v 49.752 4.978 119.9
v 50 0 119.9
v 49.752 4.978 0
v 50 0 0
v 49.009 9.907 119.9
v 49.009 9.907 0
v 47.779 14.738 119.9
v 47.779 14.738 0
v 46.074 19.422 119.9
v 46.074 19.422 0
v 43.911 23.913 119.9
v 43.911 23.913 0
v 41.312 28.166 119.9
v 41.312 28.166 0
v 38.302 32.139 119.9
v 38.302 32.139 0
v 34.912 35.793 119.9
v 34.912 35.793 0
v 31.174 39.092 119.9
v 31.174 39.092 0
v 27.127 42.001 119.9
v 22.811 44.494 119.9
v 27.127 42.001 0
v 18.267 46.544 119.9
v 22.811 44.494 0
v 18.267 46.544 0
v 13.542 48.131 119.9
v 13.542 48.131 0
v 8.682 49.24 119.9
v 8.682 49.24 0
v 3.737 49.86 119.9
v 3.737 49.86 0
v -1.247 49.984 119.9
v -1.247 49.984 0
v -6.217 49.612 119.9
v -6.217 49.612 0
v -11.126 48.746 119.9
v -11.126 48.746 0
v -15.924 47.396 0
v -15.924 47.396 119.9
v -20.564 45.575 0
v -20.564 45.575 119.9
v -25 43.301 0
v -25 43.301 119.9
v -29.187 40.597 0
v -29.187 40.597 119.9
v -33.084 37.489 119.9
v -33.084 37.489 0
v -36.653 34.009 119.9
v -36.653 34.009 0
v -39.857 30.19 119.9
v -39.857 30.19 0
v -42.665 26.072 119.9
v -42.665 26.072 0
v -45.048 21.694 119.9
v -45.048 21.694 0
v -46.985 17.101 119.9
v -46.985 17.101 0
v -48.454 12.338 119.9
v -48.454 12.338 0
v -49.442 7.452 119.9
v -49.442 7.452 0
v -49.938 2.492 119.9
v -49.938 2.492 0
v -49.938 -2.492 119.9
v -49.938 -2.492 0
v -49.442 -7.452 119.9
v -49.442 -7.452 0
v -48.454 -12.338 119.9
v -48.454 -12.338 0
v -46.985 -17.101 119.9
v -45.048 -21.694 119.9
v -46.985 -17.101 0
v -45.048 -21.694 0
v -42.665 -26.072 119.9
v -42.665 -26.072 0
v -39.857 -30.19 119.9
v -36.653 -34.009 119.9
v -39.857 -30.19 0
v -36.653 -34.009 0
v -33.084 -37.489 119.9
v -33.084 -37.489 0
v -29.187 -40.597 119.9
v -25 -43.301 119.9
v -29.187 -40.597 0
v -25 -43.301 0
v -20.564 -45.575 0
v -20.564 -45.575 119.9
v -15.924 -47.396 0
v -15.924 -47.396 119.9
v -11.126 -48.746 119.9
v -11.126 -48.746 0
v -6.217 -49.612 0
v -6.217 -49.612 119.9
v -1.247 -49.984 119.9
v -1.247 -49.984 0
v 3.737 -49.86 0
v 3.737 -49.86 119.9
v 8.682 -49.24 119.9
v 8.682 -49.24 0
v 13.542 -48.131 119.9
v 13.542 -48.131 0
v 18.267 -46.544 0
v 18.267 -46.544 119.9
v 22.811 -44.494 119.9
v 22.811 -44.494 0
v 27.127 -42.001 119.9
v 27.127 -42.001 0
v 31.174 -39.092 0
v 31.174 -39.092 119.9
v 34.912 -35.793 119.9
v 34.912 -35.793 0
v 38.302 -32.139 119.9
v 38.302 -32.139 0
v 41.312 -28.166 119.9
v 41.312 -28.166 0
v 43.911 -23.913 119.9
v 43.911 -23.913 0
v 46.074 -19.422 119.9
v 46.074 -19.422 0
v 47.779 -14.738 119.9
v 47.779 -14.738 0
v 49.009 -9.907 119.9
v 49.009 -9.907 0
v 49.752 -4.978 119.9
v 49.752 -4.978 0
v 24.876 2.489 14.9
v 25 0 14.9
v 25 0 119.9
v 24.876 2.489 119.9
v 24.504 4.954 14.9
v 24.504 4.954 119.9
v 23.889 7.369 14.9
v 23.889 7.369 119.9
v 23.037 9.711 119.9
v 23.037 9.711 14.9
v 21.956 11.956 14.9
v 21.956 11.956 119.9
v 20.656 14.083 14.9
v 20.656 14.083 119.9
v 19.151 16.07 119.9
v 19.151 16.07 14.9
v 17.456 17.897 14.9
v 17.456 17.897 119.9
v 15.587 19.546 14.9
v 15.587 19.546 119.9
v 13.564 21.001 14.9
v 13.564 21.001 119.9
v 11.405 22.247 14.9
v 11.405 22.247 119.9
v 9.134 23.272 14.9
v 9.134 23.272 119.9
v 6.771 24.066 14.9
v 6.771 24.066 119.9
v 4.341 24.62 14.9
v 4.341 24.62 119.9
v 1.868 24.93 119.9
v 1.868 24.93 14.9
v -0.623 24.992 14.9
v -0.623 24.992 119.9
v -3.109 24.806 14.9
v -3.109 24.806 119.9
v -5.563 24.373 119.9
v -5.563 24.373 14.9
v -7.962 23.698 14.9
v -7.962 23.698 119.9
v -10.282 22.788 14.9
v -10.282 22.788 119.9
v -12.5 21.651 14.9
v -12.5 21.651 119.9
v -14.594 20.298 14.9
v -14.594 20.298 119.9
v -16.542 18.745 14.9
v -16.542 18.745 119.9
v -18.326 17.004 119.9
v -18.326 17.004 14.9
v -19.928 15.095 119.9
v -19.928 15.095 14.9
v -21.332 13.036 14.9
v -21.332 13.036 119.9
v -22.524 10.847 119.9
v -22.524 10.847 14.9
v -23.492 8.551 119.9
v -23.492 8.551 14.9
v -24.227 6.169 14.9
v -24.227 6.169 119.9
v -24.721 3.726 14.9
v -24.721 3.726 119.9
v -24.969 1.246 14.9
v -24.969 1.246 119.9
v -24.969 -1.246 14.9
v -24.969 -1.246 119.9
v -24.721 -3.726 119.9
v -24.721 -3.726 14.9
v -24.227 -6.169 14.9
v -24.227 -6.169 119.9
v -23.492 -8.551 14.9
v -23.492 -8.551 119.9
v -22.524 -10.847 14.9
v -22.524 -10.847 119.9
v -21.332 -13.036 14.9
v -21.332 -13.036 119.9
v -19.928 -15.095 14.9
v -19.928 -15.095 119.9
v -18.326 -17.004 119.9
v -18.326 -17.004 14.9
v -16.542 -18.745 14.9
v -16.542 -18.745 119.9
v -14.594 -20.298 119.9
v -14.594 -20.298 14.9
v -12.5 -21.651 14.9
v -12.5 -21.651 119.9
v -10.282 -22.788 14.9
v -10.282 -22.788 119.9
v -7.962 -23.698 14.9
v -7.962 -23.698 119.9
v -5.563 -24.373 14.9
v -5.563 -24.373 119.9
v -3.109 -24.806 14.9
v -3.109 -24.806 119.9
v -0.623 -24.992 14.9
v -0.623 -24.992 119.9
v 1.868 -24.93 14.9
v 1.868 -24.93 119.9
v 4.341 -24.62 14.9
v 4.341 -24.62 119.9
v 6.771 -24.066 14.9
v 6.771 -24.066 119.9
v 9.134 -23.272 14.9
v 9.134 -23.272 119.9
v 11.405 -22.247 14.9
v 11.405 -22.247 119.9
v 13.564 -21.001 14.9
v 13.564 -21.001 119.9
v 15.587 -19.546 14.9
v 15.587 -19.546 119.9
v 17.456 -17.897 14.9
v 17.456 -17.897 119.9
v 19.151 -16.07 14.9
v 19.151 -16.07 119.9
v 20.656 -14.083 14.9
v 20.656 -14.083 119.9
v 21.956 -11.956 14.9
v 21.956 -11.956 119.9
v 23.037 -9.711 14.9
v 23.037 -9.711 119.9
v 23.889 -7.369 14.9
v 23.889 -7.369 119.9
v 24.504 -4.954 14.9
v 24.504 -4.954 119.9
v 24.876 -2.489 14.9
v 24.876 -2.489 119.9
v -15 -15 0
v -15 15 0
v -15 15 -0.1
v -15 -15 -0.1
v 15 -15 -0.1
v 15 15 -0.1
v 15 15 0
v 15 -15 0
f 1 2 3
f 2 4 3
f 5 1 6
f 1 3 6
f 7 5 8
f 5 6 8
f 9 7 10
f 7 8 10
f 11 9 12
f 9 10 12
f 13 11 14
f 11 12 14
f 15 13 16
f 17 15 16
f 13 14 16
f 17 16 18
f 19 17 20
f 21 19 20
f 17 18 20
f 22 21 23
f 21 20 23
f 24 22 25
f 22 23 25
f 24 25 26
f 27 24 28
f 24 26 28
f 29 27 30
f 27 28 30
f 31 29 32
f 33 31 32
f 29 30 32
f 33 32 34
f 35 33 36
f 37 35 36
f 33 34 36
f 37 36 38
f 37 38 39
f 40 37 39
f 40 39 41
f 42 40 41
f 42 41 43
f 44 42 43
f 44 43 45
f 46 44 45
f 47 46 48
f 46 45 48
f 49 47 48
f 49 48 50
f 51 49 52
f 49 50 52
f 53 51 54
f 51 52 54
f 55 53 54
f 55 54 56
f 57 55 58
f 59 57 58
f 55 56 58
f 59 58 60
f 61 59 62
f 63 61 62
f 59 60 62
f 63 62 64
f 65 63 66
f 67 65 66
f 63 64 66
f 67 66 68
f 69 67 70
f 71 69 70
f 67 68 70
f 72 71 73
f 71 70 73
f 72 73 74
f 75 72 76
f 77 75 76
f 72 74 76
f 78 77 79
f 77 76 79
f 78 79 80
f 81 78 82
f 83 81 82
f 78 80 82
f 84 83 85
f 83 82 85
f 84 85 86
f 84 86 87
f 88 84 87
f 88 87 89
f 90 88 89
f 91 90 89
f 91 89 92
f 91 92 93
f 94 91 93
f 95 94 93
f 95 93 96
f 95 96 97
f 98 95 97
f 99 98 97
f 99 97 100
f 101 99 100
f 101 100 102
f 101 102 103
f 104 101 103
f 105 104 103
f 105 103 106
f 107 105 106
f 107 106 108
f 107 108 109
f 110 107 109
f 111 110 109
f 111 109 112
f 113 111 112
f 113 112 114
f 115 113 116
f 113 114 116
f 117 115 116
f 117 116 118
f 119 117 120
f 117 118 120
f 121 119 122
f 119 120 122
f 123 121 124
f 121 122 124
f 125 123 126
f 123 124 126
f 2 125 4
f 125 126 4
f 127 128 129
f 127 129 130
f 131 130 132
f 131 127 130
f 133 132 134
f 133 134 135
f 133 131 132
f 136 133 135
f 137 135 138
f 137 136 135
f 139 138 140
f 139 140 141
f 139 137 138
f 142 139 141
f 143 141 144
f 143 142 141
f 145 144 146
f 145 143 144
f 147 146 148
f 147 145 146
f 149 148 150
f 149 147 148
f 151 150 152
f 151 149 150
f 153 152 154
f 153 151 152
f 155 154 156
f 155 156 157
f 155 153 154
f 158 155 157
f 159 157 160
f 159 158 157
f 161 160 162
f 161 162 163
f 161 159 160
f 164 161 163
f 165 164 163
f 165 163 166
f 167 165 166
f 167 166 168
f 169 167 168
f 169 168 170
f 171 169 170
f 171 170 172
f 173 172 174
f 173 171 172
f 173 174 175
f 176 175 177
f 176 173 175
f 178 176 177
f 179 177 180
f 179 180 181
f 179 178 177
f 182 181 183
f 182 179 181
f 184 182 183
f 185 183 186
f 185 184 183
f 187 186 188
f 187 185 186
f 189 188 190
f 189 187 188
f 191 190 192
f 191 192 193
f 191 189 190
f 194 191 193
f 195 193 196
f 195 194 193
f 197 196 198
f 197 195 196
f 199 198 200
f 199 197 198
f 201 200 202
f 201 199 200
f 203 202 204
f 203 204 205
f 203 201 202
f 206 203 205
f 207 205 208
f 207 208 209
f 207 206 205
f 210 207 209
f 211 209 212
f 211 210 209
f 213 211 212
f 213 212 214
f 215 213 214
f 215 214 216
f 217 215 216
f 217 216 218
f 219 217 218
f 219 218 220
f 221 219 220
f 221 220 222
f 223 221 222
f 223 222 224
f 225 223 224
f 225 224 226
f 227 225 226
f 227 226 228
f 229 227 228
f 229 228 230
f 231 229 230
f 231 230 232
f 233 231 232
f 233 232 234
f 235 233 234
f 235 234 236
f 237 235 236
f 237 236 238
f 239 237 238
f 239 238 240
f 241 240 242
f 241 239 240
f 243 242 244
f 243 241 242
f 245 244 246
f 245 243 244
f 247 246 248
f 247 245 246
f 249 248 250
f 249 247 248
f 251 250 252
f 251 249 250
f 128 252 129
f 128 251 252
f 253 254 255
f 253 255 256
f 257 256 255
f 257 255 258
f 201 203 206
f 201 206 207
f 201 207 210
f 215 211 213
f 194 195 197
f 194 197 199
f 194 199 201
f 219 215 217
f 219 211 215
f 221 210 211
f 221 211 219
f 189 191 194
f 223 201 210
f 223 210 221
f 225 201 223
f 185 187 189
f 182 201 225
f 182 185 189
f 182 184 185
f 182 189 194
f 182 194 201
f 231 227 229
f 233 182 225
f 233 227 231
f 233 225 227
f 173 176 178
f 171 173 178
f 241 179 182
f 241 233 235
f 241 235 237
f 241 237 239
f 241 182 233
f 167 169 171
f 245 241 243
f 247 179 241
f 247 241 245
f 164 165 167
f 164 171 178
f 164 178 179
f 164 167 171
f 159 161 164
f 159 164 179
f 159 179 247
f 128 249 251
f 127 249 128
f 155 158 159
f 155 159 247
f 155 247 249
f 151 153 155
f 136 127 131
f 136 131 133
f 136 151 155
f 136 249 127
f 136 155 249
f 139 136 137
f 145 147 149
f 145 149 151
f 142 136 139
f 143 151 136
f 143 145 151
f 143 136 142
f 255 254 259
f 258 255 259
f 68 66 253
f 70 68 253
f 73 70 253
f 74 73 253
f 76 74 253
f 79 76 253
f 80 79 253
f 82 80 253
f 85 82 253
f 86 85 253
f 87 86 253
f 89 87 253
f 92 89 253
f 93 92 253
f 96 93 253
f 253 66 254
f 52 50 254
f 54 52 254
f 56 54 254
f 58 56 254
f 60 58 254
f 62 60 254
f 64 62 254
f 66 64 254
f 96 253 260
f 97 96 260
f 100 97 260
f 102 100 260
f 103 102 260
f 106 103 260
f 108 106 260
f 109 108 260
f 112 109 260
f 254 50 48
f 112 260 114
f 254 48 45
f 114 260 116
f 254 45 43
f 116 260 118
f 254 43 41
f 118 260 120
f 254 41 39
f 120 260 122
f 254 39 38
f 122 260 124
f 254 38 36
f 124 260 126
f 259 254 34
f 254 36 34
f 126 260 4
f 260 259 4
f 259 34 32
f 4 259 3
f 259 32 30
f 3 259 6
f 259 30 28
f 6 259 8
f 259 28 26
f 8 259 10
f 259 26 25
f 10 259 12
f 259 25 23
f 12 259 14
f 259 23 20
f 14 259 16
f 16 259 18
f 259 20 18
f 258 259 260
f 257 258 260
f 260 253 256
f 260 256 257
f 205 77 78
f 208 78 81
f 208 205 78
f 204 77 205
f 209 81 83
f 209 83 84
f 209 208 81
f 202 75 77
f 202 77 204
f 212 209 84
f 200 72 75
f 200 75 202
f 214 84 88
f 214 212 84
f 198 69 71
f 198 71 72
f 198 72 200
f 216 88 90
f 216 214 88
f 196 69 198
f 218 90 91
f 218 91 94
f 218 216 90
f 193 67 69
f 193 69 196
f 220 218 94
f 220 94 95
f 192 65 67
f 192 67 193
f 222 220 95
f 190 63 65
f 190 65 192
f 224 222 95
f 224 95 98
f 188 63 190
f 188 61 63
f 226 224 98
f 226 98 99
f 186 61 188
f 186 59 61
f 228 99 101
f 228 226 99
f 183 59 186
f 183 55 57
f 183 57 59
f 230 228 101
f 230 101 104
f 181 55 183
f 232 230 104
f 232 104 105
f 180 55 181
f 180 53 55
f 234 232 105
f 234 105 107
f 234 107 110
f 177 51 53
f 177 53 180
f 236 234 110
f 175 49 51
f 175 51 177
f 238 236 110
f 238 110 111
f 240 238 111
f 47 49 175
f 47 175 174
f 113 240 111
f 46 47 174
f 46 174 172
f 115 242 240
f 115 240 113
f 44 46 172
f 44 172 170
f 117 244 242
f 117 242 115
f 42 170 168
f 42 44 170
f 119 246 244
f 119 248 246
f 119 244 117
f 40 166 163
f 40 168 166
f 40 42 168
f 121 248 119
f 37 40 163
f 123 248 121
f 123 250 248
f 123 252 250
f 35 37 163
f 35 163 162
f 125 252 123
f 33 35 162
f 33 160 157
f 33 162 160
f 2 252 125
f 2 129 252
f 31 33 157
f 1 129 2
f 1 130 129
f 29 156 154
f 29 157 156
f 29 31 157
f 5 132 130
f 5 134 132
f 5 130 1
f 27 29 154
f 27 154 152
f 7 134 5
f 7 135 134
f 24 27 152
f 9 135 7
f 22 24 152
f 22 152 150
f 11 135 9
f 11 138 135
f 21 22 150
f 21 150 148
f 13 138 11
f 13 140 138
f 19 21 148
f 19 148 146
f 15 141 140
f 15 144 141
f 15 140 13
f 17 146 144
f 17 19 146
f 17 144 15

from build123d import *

# Parameters (mm, degrees)
F0_R     = 50
F1_DEPTH = 14.9
F2_R     = 50
F2_R_2   = 25
F3_DEPTH = 105
F4_W     = 30
F4_H     = 30
F5_DEPTH = 0.1


with BuildPart() as f1:
    # F0 (on Top) → F1 (new body)
    with BuildSketch(Plane.XY):
        Circle(F0_R)
    extrude(amount=F1_DEPTH)

    # F2 (on face) → F3 (join)
    with BuildSketch(Plane.XY.offset(14.9)):
        Circle(F2_R)
        Circle(F2_R_2, mode=Mode.SUBTRACT)
    extrude(amount=F3_DEPTH)

    # F4 (on face) → F5 (join)
    with BuildSketch(Plane(origin=(0, 0, 0), x_dir=(1, 0, 0), z_dir=(0, 0, -1))):
        Rectangle(F4_W, F4_H)
    extrude(amount=F5_DEPTH)


solid = f1.part
